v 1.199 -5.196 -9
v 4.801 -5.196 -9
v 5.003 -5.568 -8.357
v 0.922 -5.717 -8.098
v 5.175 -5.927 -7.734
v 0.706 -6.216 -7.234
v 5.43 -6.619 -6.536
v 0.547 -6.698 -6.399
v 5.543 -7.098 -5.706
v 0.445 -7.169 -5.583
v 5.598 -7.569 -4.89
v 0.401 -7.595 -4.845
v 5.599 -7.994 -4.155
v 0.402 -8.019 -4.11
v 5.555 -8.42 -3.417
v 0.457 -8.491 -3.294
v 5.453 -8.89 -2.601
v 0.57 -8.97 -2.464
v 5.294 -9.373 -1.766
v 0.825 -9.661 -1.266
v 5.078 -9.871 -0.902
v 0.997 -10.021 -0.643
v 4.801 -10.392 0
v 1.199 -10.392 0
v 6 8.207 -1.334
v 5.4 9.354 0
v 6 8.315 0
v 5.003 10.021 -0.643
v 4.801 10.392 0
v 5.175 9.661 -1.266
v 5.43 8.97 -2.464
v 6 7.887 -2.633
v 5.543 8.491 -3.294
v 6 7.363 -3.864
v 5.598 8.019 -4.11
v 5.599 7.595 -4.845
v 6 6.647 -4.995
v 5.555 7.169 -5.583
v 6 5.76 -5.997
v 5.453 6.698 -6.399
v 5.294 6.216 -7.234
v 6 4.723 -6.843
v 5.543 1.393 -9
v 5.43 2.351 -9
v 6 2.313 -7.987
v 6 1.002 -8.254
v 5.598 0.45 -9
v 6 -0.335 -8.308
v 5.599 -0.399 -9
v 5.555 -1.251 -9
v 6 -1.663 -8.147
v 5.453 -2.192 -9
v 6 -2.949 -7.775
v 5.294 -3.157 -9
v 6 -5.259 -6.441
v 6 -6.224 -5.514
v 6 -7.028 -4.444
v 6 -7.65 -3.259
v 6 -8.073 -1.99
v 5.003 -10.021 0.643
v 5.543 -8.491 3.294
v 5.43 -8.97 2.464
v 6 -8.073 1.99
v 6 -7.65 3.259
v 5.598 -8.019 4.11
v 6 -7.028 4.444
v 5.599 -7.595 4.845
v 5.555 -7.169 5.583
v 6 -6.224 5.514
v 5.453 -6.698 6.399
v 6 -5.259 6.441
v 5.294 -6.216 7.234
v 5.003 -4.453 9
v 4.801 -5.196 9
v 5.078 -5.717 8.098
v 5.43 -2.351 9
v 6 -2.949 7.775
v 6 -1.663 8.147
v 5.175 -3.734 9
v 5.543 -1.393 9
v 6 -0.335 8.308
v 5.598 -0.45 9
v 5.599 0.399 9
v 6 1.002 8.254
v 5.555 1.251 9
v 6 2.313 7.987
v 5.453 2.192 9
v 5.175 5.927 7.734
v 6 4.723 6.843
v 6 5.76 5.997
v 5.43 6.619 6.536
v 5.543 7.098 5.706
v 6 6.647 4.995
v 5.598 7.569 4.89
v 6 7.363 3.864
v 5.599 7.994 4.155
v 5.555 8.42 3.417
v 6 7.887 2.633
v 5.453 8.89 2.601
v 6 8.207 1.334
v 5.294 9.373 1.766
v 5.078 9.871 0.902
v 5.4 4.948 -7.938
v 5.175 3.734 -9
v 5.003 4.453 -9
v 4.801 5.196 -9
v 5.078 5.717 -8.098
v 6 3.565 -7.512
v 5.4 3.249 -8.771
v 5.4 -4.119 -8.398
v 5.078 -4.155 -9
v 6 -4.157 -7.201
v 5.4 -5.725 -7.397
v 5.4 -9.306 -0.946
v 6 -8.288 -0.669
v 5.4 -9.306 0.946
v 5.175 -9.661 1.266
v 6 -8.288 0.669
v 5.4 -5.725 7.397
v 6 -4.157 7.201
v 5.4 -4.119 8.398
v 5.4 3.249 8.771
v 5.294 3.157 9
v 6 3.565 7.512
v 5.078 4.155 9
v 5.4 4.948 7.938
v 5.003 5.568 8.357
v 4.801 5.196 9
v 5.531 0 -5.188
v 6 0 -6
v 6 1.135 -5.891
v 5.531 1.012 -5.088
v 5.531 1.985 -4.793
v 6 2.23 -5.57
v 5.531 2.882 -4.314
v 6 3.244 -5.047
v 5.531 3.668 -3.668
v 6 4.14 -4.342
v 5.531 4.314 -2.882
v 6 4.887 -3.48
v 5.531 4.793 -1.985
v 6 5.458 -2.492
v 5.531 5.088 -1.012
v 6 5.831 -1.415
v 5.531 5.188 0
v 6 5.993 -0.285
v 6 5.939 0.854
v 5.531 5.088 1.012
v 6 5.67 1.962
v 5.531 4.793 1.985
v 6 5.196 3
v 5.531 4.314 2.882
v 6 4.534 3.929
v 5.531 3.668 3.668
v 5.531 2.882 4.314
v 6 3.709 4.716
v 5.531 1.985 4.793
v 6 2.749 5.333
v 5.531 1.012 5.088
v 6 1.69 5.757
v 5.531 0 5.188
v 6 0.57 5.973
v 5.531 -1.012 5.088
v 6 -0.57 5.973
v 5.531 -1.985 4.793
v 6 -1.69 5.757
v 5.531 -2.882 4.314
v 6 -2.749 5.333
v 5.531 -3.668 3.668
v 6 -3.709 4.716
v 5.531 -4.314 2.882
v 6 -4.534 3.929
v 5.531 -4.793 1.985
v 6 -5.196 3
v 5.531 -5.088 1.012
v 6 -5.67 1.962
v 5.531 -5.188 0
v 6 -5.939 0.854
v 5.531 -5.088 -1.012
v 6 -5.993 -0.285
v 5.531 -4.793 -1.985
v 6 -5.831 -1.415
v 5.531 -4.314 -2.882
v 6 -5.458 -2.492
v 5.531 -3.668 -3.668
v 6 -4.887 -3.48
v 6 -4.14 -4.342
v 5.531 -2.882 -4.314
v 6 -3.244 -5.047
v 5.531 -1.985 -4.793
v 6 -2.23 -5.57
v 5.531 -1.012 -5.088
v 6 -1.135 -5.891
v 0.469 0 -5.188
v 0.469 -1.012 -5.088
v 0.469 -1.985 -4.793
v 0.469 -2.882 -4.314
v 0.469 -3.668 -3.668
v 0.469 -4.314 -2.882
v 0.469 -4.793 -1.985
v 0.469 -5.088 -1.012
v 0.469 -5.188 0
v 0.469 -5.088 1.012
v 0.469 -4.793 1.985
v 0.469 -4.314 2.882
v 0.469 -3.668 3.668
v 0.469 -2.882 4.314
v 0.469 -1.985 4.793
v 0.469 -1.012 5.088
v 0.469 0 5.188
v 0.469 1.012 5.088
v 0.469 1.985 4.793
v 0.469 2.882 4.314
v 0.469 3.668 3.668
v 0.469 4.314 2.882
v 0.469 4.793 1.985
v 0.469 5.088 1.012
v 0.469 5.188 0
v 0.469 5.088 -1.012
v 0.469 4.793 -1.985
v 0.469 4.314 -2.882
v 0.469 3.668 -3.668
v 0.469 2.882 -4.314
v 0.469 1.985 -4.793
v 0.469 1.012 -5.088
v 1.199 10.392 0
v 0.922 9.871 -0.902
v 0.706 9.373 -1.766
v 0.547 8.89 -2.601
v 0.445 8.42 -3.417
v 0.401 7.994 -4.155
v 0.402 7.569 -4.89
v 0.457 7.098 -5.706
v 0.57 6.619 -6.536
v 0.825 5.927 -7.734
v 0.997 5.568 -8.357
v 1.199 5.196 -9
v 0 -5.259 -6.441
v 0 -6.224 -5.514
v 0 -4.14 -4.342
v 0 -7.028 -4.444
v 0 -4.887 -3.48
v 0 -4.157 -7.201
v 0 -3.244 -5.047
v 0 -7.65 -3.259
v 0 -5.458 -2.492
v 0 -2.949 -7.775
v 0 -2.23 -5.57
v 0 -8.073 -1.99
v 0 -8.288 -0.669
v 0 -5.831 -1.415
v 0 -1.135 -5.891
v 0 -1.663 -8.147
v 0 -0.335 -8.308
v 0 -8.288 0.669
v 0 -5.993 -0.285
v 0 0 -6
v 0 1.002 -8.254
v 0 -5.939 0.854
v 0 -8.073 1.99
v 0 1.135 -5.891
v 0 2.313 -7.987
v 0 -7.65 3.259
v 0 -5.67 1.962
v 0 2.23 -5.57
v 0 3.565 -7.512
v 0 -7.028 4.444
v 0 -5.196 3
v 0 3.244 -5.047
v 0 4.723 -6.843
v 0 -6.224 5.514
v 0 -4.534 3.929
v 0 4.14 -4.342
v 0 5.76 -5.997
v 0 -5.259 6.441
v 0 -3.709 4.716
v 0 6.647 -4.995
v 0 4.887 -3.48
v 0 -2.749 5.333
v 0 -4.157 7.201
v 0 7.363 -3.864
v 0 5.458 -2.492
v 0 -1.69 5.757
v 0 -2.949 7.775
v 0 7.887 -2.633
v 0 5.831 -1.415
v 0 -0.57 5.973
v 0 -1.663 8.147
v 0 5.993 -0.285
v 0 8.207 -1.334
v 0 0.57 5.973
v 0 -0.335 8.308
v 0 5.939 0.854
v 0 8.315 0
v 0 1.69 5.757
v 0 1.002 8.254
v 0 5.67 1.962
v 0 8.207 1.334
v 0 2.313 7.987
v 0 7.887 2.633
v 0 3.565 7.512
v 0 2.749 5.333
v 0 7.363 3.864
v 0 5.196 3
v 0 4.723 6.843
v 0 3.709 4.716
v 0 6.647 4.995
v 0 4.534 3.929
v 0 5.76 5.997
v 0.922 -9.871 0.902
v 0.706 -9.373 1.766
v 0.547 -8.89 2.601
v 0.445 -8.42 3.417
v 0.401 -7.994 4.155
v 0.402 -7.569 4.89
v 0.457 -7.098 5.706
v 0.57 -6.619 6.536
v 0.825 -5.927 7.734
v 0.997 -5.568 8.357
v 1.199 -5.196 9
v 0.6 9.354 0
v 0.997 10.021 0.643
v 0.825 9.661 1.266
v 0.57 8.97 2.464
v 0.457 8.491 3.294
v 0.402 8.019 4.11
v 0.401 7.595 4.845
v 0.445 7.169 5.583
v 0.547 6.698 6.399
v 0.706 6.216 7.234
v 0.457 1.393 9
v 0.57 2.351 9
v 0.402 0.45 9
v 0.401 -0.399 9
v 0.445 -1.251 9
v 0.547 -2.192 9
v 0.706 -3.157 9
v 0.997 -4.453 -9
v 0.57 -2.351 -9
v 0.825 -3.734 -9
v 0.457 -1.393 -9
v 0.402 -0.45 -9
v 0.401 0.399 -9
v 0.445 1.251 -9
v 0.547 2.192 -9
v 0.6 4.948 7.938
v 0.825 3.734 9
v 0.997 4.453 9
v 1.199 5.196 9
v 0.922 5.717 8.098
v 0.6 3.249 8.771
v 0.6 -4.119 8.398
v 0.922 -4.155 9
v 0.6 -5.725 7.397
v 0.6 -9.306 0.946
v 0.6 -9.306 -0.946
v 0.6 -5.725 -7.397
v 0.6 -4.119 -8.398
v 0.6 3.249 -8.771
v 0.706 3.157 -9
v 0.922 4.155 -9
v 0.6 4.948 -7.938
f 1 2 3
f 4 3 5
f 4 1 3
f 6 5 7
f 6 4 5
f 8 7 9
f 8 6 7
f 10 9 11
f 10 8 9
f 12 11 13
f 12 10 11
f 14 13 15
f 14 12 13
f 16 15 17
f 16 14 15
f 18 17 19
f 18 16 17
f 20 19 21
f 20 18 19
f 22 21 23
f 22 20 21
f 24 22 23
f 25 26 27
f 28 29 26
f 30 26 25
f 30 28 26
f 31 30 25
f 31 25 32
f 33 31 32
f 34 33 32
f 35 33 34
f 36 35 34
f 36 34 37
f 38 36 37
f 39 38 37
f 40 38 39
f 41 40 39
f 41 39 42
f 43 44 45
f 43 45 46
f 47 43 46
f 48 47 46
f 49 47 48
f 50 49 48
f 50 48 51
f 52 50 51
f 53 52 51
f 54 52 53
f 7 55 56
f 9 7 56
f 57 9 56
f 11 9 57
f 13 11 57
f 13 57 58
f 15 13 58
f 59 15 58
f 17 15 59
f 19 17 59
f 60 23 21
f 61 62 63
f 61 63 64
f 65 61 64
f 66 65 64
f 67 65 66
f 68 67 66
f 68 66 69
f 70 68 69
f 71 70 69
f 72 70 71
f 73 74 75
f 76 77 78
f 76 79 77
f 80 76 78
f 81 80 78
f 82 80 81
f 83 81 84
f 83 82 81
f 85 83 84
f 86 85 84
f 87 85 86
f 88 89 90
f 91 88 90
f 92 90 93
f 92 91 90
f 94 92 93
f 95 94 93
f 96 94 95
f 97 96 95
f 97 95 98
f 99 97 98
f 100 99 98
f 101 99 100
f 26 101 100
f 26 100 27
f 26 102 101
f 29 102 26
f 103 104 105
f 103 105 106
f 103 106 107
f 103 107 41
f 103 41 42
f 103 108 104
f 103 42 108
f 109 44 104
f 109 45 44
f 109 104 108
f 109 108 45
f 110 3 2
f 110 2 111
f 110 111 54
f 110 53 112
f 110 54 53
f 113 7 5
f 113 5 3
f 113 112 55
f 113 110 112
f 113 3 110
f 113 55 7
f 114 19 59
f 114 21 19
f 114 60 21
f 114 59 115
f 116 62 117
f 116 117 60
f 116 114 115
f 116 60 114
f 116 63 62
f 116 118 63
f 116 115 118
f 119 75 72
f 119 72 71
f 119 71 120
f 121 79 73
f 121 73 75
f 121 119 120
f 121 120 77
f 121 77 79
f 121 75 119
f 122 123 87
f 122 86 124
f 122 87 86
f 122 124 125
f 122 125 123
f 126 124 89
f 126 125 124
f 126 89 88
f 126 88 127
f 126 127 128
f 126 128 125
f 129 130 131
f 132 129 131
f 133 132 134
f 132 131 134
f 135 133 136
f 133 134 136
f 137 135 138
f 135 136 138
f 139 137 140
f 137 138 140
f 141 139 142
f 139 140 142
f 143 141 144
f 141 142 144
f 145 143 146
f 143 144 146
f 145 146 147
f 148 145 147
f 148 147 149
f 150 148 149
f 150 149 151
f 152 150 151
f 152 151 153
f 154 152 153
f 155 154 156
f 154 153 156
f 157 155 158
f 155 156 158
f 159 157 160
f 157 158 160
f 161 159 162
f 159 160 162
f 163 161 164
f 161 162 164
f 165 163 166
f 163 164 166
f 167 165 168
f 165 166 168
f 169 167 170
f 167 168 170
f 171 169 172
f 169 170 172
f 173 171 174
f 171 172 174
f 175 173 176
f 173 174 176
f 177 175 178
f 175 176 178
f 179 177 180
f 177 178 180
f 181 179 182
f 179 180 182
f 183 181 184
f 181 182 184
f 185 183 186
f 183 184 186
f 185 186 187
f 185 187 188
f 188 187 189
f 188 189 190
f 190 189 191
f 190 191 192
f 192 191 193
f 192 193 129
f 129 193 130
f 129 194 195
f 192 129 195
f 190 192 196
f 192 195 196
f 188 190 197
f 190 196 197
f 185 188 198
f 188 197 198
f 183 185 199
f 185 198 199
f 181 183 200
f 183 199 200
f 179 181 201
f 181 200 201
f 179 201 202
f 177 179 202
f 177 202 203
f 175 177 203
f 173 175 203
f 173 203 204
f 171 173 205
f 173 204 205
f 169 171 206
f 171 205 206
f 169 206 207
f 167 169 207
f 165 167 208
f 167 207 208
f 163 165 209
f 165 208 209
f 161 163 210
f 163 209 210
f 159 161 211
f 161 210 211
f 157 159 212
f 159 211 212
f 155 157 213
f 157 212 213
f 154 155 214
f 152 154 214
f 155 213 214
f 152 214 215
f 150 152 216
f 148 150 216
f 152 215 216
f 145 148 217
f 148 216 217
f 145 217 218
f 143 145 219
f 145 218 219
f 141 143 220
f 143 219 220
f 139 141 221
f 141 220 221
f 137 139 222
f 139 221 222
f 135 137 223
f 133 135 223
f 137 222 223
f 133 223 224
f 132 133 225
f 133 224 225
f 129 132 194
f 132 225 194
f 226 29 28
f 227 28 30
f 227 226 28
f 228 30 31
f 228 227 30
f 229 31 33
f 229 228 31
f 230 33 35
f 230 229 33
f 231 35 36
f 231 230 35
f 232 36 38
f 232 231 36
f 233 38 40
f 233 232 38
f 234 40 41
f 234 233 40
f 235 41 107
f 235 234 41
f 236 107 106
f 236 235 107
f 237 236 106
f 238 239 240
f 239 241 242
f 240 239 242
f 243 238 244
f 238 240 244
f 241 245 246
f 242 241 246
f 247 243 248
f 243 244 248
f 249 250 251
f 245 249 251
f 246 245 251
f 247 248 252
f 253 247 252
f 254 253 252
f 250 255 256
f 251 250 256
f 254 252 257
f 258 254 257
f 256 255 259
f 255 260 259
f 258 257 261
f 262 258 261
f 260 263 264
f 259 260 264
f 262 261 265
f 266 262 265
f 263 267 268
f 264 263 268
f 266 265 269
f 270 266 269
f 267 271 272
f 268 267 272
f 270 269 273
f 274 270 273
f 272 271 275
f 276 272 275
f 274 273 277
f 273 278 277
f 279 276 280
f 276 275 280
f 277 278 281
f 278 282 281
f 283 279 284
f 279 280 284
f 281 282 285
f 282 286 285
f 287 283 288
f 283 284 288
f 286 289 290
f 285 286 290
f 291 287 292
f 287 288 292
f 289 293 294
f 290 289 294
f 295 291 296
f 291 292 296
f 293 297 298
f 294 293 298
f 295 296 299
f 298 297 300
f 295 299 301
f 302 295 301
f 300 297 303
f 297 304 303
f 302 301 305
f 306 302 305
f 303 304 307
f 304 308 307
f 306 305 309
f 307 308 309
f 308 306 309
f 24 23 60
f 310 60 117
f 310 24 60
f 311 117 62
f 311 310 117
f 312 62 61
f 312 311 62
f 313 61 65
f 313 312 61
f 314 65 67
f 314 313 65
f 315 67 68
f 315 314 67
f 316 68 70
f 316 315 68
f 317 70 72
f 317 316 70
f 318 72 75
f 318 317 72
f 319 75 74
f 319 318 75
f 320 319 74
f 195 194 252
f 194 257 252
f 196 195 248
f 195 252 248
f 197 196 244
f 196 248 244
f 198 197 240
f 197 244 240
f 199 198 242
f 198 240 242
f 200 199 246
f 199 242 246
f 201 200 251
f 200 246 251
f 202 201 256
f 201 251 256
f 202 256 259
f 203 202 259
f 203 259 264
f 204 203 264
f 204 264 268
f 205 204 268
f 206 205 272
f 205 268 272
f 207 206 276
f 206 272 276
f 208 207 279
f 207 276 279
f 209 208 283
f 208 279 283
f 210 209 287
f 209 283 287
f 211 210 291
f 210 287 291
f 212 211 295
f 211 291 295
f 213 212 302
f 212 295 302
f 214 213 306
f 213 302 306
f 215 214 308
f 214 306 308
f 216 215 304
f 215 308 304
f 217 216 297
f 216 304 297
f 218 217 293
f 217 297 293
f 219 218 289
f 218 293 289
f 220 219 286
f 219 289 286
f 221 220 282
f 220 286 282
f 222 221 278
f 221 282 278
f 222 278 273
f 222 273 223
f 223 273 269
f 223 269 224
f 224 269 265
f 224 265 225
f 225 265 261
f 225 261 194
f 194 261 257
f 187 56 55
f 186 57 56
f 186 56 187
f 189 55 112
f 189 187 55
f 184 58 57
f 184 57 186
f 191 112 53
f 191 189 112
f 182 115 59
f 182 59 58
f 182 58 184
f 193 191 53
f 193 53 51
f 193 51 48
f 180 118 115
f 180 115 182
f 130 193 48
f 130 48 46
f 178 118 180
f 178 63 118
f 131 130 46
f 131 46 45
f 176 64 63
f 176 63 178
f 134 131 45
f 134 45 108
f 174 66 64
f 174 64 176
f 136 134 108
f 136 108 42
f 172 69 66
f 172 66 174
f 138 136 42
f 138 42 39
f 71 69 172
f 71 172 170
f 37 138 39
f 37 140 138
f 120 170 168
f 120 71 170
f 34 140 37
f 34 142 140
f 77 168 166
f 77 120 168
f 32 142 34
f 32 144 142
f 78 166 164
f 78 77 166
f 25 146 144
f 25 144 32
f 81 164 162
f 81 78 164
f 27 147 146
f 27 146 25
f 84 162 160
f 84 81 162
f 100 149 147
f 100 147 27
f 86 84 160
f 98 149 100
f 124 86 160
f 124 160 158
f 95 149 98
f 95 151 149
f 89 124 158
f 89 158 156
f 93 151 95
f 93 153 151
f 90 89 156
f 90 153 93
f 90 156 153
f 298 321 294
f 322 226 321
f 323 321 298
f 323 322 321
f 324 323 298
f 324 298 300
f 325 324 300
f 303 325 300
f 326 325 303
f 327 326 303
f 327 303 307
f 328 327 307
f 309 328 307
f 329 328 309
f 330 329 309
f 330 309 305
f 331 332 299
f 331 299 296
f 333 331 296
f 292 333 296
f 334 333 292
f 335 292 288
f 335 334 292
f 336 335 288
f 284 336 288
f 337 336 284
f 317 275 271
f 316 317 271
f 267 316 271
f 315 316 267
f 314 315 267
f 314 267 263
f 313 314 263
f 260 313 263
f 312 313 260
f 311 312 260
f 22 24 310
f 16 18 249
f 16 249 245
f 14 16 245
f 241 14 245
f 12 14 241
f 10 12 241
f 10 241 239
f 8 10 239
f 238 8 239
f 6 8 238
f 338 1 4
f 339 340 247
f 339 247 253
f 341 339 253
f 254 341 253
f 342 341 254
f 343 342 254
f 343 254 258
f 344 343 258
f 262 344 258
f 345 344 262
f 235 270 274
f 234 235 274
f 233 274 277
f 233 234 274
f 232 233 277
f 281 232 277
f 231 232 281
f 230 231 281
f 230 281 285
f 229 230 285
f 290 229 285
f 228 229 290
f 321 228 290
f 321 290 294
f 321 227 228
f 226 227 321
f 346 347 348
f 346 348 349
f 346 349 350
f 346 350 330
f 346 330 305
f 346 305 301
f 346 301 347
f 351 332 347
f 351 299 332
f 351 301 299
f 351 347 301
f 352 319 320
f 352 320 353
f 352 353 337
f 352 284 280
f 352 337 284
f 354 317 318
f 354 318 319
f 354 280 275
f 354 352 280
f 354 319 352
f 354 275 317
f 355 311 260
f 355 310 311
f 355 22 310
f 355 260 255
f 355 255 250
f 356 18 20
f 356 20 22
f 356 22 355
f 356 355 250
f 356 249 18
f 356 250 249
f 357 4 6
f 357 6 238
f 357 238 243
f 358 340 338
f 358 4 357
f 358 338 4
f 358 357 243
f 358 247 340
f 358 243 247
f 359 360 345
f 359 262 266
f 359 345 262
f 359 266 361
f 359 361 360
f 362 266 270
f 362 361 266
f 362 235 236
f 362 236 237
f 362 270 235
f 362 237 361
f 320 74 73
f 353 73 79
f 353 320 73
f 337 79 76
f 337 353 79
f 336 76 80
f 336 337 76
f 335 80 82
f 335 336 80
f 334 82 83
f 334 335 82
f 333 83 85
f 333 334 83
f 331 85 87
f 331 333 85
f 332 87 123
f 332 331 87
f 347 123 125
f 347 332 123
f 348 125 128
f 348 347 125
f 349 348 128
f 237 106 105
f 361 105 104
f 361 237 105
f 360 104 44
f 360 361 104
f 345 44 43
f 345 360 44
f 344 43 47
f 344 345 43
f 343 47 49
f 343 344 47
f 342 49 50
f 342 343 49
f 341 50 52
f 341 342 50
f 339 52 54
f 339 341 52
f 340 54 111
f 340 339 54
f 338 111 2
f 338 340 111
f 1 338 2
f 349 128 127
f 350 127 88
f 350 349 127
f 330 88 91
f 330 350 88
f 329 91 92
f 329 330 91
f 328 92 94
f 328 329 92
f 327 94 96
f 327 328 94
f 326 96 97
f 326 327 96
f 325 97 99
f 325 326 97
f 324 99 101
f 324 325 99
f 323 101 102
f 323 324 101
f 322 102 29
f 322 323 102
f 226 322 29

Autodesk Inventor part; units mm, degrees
ref_plane "YZ Plane" through (0, 0, 0) normal (1, 0, 0) x (0, 1, 0)
ref_plane "XZ Plane" through (0, 0, 0) normal (0, 1, 0) x (-1, 0, 0)
sketch "Эскиз1" plane through (0, 0, 0) normal (1, 0, 0) x (0, 1, 0)
  line L0 (-10.3923, 0) -> (-5.1962, 9)
  line L1 (-5.1962, 9) -> (5.1962, 9)
  line L2 (5.1962, 9) -> (10.3923, 0)
  line L3 (10.3923, 0) -> (5.1962, -9)
  line L4 (5.1962, -9) -> (-5.1962, -9)
  line L5 (-5.1962, -9) -> (-10.3923, 0)
  point P0 (0, 0)
  point P1 (0, 0)
  dimension "d0" = 20.7846
extrude "Базовый элемент" add sketch "Эскиз1" along normal blind 6
sketch "Эскиз2" plane through (0, 0, 0) normal (0, 0, 1) x (1, 0, 0)
  line L0 (0, 5.1962) -> (0, 10.3923) projected
  line L1 (0, 10.3923) -> (6, 10.3923) projected
  line L2 (6, 5.1962) -> (6, 10.3923) projected
  line L3 (-1.2, 0) -> (7.2, 0) projected
  line L4 (1.1993, 10.3923) -> (0, 8.315)
  line L5 (4.8007, 10.3923) -> (6, 8.315)
  dimension "d3" = 30
  dimension "d4" = 30
  dimension "d5" = 16.63
  dimension "d6" = 16.63
revolve "Фаска1" cut sketch "Эскиз2" angle 360 about axis through (-10, 0, 0) along (1, 0, 0)
sketch "Эскиз3" plane through (6, 0, 0) normal (1, 0, 0) x (0, 0, -1)
  arc A0 (-0.625, -1.0825) -> (0.625, -1.0825) centre (0, 0) ccw projected
hole "Резьба" at (6, 0, 0) direction (-1, 0, 0) diameter 10.376 end through all thread size "M12x1.5" class "6H" standard "ISO Metric profile"
chamfer "Фаска2" distance 0.8119 angle 30 1 edges at (6, 0, 5.188) measured on face at (6, 7.1795, -0.8718)
chamfer "Фаска3" distance 0.8119 angle 30 1 edges at (0, 0, 5.188) measured on face at (0, 7.1795, -0.8718)
ref_plane "Work Plane1" through (-22.2768, 0, 0) normal (0, -0.8660254, -0.5) x (1, 0, 0)
equation "\"d0\" = 1.1547 * SW"
equation "\"d1\" = KOH"
equation "\"d3\" = ANG1"
equation "\"d4\" = ANG2"
equation "\"d5\" = SW0"
equation "\"d6\" = SW01"
equation "\"d8\" = -0.5 * GD1 + 0.5 * NND"
equation "\"d40\" = -0.5 * GD1 + 0.5 * NND"
equation "\"d10\" = -0.5 * GD1 + 0.5 * NND"
equation "\"d41\" = -0.5 * GD1 + 0.5 * NND"
equation "\"ANG1\" = 30deg"
equation "\"ANG2\" = 30deg"
equation "\"NND\" = 12"
equation "\"KOH\" = 6"
equation "\"SW\" = 18"
equation "\"SW0\" = 16.63"
equation "\"SW01\" = SW0"
equation "\"GUL\" = 0.541266 * PTC"
equation "\"LADI\" = 12.345"
equation "\"TOA\" = 30deg"
equation "\"FAWI\" = 30deg"
equation "\"PTC\" = 1.5"
equation "\"THREADDIA\" = 12"
equation "\"E0\" = 1.155 * SW"
equation "\"GAL\" = 0.541266 * PTC"
equation "\"GD1\" = 10.376202"
properties part number "Копия гайки M12x1.5-6H ГОСТ 5916-70" material "Сталь, мягкая"
